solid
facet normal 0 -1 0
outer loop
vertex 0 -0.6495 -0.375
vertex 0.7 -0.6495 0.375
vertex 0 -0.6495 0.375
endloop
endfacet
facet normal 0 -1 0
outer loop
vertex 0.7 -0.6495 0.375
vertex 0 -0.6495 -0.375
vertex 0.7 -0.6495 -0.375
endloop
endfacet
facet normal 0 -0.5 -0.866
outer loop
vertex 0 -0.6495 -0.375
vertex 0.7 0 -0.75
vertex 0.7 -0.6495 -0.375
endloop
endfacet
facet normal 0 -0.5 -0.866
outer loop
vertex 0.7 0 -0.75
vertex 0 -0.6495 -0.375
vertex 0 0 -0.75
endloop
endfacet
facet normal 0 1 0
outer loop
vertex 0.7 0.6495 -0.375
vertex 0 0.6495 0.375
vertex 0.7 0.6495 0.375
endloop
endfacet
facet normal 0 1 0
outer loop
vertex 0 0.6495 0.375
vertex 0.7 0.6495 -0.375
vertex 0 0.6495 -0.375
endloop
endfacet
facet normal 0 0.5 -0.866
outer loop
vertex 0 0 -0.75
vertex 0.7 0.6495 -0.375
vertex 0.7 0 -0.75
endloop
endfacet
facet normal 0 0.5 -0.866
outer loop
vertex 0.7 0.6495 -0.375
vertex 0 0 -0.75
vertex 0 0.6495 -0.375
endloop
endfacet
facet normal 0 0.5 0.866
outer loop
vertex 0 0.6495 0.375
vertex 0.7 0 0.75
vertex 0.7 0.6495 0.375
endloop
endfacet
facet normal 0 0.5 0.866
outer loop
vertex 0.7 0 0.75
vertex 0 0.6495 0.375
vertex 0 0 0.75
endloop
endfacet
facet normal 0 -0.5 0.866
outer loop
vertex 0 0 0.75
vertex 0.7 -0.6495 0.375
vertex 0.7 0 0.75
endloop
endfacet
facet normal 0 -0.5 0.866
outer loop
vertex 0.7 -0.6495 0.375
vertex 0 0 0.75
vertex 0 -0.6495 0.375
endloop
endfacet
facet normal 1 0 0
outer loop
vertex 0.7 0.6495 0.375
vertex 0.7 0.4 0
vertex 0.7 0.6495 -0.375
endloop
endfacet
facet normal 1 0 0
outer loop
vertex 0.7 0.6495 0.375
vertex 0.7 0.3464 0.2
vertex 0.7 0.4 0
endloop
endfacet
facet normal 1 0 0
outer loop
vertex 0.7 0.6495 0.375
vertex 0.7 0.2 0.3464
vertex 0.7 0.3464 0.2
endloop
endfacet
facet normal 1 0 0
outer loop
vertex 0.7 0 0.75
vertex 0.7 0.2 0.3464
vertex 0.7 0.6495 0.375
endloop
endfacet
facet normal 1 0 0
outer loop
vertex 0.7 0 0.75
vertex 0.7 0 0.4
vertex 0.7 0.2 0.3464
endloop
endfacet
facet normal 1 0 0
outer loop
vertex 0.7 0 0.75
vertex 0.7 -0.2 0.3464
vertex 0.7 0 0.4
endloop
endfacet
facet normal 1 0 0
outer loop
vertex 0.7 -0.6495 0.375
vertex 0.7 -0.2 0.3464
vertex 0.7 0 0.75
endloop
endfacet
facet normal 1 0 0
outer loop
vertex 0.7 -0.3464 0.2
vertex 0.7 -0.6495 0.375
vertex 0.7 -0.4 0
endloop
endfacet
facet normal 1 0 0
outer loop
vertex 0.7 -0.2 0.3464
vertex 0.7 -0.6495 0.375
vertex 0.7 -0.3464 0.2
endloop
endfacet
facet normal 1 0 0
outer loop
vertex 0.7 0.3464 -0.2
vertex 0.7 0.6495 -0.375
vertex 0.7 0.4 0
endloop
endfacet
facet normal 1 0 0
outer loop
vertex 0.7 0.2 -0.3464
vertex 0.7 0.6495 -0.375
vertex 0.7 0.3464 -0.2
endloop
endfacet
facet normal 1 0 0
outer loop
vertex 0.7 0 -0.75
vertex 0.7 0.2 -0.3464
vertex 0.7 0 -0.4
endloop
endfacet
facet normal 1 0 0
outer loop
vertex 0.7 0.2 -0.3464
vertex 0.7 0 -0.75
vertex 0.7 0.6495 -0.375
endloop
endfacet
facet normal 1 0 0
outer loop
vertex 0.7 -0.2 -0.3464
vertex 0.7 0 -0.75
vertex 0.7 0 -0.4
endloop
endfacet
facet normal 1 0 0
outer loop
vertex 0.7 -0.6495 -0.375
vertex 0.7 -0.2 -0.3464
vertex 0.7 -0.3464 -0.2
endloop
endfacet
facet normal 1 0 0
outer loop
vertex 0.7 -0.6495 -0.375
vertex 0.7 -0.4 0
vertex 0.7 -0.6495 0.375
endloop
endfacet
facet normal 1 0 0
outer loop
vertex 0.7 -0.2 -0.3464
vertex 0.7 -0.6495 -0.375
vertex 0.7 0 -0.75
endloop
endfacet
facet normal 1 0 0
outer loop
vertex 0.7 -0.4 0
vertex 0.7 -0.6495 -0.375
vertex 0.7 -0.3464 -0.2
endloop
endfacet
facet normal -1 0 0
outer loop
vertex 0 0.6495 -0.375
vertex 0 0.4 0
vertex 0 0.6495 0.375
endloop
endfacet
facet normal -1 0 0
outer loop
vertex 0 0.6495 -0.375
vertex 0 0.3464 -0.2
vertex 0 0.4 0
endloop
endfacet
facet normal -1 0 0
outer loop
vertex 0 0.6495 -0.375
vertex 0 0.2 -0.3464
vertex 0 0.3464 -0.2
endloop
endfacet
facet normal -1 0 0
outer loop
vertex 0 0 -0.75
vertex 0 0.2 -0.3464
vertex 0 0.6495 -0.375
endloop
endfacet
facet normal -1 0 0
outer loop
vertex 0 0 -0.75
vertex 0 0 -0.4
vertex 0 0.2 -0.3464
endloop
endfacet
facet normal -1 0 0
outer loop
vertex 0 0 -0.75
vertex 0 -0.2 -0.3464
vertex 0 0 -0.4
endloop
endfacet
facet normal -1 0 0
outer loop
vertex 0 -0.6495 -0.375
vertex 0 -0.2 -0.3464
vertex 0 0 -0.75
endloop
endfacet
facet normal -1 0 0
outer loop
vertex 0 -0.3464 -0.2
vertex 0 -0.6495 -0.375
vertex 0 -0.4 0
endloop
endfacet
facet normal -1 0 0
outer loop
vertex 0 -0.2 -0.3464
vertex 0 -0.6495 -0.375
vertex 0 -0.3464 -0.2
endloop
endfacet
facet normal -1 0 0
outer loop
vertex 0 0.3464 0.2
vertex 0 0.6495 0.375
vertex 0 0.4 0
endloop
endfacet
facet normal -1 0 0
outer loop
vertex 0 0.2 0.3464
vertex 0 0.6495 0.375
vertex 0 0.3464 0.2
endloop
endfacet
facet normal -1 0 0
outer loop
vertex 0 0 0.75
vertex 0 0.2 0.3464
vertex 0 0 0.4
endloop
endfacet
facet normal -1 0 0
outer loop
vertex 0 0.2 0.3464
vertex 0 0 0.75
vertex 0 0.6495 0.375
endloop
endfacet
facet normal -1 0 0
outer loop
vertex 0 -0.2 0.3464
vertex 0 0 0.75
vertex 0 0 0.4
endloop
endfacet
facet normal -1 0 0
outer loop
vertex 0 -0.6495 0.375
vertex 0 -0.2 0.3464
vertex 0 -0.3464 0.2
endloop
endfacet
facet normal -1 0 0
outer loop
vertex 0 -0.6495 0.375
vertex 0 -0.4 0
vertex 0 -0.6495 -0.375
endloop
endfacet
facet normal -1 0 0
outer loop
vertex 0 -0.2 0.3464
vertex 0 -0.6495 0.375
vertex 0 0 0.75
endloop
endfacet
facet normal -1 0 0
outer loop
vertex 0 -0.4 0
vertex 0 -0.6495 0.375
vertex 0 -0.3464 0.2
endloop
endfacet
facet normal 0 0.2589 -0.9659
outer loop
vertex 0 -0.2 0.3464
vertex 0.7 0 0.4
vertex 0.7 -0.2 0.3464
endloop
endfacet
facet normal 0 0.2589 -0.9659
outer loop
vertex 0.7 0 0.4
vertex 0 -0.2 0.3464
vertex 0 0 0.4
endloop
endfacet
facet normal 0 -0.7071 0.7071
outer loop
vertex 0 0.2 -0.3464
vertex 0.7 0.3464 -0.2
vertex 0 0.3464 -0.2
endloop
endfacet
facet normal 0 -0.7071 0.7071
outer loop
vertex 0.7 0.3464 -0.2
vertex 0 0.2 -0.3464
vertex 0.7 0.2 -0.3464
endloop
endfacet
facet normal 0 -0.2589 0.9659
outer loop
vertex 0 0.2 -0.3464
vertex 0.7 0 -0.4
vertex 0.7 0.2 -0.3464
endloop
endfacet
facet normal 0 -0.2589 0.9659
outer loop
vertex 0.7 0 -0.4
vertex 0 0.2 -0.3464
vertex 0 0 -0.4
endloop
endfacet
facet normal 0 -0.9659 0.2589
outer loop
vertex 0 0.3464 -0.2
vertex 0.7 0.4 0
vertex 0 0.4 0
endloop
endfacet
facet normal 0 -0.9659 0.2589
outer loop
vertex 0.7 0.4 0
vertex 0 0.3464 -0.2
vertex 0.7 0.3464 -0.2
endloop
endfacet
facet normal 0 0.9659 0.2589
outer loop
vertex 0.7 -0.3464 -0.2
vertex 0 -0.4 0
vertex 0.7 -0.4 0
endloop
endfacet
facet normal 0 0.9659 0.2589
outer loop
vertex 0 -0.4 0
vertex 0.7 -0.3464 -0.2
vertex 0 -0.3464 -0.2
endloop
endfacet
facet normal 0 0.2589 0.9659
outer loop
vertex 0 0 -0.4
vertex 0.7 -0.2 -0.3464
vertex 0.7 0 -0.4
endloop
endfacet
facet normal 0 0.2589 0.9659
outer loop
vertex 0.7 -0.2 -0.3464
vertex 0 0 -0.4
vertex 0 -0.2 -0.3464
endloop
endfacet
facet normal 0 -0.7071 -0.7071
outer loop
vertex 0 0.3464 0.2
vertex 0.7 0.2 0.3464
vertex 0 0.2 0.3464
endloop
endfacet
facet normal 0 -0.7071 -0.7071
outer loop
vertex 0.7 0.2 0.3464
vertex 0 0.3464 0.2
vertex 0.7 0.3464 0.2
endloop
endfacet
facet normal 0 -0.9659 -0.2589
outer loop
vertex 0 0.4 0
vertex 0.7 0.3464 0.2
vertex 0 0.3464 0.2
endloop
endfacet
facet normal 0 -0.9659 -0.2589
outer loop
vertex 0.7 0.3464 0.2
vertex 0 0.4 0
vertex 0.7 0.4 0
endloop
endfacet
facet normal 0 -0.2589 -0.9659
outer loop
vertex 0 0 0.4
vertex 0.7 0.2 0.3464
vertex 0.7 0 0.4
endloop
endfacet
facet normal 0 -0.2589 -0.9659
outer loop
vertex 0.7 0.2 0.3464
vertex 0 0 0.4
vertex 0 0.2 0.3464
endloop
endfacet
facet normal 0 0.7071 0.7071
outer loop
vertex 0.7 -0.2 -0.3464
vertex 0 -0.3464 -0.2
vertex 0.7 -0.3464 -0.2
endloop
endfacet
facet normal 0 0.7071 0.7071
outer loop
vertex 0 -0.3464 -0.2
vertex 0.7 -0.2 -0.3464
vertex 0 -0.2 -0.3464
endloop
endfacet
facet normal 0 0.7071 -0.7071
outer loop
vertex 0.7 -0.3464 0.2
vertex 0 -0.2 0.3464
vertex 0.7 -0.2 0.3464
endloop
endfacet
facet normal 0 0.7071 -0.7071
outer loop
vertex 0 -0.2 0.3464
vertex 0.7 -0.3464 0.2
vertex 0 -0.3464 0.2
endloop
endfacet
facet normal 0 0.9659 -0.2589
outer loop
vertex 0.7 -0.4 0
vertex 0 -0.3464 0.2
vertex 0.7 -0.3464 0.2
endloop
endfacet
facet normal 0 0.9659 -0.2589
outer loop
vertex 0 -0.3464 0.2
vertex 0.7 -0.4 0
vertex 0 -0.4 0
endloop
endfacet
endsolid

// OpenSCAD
module nut(rotation=0, 
  hex_diameter = 1.5,
  hex_length = 0.7,
  hole = 0.80) 
{
    rotate([0,90,rotation]) 
    color([0.0,0.8,1.0])
    translate([0,0,hex_length*0.5]) 
    {
        difference() {
            cylinder(h=hex_length, r=hex_diameter/2, $fn = 6, center=true);
            cylinder(h=hex_length+0.1, r=hole/2, $fn = 12, center=true);
        }
    }
}

nut();
